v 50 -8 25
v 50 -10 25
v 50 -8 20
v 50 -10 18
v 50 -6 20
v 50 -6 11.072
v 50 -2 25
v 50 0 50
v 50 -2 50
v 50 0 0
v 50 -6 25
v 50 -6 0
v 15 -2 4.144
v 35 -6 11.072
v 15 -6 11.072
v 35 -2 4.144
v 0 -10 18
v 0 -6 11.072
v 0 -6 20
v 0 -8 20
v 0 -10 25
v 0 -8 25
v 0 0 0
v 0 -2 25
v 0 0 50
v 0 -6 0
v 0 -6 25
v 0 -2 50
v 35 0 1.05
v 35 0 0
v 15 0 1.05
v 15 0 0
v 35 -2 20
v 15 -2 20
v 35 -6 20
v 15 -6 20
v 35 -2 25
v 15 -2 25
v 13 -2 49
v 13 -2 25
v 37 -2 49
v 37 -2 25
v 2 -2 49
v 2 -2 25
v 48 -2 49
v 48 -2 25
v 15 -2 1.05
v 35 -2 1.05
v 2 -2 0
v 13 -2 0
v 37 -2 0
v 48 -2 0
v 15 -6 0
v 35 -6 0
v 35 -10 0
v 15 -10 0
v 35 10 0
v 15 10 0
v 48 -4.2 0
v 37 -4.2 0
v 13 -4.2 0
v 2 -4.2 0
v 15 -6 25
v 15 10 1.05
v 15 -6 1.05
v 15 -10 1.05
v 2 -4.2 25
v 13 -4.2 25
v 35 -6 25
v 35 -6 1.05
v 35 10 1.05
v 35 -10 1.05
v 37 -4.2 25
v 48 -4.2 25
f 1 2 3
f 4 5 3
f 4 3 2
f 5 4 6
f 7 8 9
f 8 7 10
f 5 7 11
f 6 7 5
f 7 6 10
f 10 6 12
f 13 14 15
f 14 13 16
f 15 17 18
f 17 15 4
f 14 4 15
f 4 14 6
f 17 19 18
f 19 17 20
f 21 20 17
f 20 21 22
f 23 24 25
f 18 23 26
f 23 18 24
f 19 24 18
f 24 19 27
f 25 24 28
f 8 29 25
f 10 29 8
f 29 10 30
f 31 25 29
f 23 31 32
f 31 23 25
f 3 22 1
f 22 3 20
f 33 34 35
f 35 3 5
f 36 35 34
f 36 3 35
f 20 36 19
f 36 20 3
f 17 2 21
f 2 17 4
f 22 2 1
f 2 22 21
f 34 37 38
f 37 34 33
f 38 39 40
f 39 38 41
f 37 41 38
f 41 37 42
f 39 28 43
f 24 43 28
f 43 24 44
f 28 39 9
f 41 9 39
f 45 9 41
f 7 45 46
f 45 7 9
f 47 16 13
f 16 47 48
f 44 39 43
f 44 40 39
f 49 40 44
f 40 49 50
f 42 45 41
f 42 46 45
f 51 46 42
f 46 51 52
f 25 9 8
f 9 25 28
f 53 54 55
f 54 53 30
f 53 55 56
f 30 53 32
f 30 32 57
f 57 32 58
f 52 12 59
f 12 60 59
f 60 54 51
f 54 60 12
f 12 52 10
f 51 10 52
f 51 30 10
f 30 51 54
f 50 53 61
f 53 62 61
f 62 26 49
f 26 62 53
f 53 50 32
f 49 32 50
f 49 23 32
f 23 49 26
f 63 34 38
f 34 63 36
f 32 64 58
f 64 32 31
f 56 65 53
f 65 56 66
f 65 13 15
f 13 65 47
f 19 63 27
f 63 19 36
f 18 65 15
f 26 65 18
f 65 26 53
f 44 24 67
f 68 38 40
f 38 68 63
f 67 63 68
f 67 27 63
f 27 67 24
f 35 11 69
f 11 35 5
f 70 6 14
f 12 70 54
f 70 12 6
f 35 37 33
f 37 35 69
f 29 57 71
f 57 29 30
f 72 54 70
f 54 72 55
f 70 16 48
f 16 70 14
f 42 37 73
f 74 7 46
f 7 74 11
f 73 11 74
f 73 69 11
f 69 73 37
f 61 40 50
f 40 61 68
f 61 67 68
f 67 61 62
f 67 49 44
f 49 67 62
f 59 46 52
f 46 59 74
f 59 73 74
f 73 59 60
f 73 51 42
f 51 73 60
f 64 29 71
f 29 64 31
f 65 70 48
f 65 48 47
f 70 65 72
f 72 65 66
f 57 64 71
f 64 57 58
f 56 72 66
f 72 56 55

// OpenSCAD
inf=1000;
c_w=5;

module slope(h=10, a=30, w=4){
    b=h*tan(a);
    translate([w,0,0])
        rotate([90, 0, -90])
        linear_extrude(height=w)
            polygon(points=[[0,0],[b,0],[0,h]], paths=[[0,1,2]]);
}

module ceiling_clip_slides(plate_x, plate_y, t, c_t=3, slide_w=10, slide_l=40, r=1) {
    union() {
        translate([t, 0, 0]) cube([slide_w*r, slide_l, t*r]);
        translate([plate_x-slide_w*r-t, 0, 0]) cube([slide_w*r, slide_l, t*r]);
    }
}

module ceiling_clip_b(plate_x, plate_y, t, c_t=2, slide_w=10, slide_l=40) {
    union(){
        ceiling_clip_slides(plate_x, plate_y, t, c_t, slide_w, slide_l+t);
        translate([0, slide_l, 0])
            difference(){
                union(){
                    cube([plate_x, t, t*3+c_t]);
                    translate([0,-c_w,t*2+c_t]) cube([plate_x, t+c_w, t]);
                    translate([0,-c_w,0]) cube([plate_x, t+c_w, 2*t]);
                }
                // FIXME check if this hole meets slides
                translate([plate_x/2,t/2,0])
                    rotate([90,0,0])
                        cylinder(r=t*2+c_t, h=inf, center=true);
            }
    }
}

module ceiling_clip_a(plate_x, plate_y, t, c_t=2, slide_w=10, slide_l=40) {
    slide_hole_r=1.1;
    slide_box_w=slide_w*slide_hole_r+2*t;
    difference() {
        union() {
            //base
            cube([plate_x,plate_y,t]);
            //grip
            translate([0,plate_y/2-c_w-t,0])
                union(){
                    slope(a=60, h=t*4+c_t, w=plate_x);
                    cube([plate_x, t, t*3+c_t]);
                    translate([0,0,t*3+c_t]) cube([plate_x, t+c_w, t]);
                }
            //slide box
            translate([0, 0, t]) cube([slide_box_w, plate_y/2, t*2]);
            translate([plate_x-slide_box_w, 0, t]) cube([slide_box_w, plate_y/2, t*2]);
        }
        //slide holes
        translate([0, -1, t])
            ceiling_clip_slides(plate_x, plate_y, t, c_t, slide_w, slide_l=plate_x, r=slide_hole_r);
        translate([-inf/2,-inf,-inf/2]) cube([inf, inf, inf]);
    }
}


/*
rotate([-90,0,0])
translate([0,0,2]) ceiling_clip_b(50, 50, 2);
*/
union() {
    translate([0,0,0]) rotate([90,0,0]) ceiling_clip_a(50, 50, 2);
    translate([15,-10,0])cube([20,20,1.05]);
}
//ceiling_clip_a(50, 50, 2);
//translate([0, $t*50, 2]) ceiling_clip_b(50, 50, 2, slide_l=40);
